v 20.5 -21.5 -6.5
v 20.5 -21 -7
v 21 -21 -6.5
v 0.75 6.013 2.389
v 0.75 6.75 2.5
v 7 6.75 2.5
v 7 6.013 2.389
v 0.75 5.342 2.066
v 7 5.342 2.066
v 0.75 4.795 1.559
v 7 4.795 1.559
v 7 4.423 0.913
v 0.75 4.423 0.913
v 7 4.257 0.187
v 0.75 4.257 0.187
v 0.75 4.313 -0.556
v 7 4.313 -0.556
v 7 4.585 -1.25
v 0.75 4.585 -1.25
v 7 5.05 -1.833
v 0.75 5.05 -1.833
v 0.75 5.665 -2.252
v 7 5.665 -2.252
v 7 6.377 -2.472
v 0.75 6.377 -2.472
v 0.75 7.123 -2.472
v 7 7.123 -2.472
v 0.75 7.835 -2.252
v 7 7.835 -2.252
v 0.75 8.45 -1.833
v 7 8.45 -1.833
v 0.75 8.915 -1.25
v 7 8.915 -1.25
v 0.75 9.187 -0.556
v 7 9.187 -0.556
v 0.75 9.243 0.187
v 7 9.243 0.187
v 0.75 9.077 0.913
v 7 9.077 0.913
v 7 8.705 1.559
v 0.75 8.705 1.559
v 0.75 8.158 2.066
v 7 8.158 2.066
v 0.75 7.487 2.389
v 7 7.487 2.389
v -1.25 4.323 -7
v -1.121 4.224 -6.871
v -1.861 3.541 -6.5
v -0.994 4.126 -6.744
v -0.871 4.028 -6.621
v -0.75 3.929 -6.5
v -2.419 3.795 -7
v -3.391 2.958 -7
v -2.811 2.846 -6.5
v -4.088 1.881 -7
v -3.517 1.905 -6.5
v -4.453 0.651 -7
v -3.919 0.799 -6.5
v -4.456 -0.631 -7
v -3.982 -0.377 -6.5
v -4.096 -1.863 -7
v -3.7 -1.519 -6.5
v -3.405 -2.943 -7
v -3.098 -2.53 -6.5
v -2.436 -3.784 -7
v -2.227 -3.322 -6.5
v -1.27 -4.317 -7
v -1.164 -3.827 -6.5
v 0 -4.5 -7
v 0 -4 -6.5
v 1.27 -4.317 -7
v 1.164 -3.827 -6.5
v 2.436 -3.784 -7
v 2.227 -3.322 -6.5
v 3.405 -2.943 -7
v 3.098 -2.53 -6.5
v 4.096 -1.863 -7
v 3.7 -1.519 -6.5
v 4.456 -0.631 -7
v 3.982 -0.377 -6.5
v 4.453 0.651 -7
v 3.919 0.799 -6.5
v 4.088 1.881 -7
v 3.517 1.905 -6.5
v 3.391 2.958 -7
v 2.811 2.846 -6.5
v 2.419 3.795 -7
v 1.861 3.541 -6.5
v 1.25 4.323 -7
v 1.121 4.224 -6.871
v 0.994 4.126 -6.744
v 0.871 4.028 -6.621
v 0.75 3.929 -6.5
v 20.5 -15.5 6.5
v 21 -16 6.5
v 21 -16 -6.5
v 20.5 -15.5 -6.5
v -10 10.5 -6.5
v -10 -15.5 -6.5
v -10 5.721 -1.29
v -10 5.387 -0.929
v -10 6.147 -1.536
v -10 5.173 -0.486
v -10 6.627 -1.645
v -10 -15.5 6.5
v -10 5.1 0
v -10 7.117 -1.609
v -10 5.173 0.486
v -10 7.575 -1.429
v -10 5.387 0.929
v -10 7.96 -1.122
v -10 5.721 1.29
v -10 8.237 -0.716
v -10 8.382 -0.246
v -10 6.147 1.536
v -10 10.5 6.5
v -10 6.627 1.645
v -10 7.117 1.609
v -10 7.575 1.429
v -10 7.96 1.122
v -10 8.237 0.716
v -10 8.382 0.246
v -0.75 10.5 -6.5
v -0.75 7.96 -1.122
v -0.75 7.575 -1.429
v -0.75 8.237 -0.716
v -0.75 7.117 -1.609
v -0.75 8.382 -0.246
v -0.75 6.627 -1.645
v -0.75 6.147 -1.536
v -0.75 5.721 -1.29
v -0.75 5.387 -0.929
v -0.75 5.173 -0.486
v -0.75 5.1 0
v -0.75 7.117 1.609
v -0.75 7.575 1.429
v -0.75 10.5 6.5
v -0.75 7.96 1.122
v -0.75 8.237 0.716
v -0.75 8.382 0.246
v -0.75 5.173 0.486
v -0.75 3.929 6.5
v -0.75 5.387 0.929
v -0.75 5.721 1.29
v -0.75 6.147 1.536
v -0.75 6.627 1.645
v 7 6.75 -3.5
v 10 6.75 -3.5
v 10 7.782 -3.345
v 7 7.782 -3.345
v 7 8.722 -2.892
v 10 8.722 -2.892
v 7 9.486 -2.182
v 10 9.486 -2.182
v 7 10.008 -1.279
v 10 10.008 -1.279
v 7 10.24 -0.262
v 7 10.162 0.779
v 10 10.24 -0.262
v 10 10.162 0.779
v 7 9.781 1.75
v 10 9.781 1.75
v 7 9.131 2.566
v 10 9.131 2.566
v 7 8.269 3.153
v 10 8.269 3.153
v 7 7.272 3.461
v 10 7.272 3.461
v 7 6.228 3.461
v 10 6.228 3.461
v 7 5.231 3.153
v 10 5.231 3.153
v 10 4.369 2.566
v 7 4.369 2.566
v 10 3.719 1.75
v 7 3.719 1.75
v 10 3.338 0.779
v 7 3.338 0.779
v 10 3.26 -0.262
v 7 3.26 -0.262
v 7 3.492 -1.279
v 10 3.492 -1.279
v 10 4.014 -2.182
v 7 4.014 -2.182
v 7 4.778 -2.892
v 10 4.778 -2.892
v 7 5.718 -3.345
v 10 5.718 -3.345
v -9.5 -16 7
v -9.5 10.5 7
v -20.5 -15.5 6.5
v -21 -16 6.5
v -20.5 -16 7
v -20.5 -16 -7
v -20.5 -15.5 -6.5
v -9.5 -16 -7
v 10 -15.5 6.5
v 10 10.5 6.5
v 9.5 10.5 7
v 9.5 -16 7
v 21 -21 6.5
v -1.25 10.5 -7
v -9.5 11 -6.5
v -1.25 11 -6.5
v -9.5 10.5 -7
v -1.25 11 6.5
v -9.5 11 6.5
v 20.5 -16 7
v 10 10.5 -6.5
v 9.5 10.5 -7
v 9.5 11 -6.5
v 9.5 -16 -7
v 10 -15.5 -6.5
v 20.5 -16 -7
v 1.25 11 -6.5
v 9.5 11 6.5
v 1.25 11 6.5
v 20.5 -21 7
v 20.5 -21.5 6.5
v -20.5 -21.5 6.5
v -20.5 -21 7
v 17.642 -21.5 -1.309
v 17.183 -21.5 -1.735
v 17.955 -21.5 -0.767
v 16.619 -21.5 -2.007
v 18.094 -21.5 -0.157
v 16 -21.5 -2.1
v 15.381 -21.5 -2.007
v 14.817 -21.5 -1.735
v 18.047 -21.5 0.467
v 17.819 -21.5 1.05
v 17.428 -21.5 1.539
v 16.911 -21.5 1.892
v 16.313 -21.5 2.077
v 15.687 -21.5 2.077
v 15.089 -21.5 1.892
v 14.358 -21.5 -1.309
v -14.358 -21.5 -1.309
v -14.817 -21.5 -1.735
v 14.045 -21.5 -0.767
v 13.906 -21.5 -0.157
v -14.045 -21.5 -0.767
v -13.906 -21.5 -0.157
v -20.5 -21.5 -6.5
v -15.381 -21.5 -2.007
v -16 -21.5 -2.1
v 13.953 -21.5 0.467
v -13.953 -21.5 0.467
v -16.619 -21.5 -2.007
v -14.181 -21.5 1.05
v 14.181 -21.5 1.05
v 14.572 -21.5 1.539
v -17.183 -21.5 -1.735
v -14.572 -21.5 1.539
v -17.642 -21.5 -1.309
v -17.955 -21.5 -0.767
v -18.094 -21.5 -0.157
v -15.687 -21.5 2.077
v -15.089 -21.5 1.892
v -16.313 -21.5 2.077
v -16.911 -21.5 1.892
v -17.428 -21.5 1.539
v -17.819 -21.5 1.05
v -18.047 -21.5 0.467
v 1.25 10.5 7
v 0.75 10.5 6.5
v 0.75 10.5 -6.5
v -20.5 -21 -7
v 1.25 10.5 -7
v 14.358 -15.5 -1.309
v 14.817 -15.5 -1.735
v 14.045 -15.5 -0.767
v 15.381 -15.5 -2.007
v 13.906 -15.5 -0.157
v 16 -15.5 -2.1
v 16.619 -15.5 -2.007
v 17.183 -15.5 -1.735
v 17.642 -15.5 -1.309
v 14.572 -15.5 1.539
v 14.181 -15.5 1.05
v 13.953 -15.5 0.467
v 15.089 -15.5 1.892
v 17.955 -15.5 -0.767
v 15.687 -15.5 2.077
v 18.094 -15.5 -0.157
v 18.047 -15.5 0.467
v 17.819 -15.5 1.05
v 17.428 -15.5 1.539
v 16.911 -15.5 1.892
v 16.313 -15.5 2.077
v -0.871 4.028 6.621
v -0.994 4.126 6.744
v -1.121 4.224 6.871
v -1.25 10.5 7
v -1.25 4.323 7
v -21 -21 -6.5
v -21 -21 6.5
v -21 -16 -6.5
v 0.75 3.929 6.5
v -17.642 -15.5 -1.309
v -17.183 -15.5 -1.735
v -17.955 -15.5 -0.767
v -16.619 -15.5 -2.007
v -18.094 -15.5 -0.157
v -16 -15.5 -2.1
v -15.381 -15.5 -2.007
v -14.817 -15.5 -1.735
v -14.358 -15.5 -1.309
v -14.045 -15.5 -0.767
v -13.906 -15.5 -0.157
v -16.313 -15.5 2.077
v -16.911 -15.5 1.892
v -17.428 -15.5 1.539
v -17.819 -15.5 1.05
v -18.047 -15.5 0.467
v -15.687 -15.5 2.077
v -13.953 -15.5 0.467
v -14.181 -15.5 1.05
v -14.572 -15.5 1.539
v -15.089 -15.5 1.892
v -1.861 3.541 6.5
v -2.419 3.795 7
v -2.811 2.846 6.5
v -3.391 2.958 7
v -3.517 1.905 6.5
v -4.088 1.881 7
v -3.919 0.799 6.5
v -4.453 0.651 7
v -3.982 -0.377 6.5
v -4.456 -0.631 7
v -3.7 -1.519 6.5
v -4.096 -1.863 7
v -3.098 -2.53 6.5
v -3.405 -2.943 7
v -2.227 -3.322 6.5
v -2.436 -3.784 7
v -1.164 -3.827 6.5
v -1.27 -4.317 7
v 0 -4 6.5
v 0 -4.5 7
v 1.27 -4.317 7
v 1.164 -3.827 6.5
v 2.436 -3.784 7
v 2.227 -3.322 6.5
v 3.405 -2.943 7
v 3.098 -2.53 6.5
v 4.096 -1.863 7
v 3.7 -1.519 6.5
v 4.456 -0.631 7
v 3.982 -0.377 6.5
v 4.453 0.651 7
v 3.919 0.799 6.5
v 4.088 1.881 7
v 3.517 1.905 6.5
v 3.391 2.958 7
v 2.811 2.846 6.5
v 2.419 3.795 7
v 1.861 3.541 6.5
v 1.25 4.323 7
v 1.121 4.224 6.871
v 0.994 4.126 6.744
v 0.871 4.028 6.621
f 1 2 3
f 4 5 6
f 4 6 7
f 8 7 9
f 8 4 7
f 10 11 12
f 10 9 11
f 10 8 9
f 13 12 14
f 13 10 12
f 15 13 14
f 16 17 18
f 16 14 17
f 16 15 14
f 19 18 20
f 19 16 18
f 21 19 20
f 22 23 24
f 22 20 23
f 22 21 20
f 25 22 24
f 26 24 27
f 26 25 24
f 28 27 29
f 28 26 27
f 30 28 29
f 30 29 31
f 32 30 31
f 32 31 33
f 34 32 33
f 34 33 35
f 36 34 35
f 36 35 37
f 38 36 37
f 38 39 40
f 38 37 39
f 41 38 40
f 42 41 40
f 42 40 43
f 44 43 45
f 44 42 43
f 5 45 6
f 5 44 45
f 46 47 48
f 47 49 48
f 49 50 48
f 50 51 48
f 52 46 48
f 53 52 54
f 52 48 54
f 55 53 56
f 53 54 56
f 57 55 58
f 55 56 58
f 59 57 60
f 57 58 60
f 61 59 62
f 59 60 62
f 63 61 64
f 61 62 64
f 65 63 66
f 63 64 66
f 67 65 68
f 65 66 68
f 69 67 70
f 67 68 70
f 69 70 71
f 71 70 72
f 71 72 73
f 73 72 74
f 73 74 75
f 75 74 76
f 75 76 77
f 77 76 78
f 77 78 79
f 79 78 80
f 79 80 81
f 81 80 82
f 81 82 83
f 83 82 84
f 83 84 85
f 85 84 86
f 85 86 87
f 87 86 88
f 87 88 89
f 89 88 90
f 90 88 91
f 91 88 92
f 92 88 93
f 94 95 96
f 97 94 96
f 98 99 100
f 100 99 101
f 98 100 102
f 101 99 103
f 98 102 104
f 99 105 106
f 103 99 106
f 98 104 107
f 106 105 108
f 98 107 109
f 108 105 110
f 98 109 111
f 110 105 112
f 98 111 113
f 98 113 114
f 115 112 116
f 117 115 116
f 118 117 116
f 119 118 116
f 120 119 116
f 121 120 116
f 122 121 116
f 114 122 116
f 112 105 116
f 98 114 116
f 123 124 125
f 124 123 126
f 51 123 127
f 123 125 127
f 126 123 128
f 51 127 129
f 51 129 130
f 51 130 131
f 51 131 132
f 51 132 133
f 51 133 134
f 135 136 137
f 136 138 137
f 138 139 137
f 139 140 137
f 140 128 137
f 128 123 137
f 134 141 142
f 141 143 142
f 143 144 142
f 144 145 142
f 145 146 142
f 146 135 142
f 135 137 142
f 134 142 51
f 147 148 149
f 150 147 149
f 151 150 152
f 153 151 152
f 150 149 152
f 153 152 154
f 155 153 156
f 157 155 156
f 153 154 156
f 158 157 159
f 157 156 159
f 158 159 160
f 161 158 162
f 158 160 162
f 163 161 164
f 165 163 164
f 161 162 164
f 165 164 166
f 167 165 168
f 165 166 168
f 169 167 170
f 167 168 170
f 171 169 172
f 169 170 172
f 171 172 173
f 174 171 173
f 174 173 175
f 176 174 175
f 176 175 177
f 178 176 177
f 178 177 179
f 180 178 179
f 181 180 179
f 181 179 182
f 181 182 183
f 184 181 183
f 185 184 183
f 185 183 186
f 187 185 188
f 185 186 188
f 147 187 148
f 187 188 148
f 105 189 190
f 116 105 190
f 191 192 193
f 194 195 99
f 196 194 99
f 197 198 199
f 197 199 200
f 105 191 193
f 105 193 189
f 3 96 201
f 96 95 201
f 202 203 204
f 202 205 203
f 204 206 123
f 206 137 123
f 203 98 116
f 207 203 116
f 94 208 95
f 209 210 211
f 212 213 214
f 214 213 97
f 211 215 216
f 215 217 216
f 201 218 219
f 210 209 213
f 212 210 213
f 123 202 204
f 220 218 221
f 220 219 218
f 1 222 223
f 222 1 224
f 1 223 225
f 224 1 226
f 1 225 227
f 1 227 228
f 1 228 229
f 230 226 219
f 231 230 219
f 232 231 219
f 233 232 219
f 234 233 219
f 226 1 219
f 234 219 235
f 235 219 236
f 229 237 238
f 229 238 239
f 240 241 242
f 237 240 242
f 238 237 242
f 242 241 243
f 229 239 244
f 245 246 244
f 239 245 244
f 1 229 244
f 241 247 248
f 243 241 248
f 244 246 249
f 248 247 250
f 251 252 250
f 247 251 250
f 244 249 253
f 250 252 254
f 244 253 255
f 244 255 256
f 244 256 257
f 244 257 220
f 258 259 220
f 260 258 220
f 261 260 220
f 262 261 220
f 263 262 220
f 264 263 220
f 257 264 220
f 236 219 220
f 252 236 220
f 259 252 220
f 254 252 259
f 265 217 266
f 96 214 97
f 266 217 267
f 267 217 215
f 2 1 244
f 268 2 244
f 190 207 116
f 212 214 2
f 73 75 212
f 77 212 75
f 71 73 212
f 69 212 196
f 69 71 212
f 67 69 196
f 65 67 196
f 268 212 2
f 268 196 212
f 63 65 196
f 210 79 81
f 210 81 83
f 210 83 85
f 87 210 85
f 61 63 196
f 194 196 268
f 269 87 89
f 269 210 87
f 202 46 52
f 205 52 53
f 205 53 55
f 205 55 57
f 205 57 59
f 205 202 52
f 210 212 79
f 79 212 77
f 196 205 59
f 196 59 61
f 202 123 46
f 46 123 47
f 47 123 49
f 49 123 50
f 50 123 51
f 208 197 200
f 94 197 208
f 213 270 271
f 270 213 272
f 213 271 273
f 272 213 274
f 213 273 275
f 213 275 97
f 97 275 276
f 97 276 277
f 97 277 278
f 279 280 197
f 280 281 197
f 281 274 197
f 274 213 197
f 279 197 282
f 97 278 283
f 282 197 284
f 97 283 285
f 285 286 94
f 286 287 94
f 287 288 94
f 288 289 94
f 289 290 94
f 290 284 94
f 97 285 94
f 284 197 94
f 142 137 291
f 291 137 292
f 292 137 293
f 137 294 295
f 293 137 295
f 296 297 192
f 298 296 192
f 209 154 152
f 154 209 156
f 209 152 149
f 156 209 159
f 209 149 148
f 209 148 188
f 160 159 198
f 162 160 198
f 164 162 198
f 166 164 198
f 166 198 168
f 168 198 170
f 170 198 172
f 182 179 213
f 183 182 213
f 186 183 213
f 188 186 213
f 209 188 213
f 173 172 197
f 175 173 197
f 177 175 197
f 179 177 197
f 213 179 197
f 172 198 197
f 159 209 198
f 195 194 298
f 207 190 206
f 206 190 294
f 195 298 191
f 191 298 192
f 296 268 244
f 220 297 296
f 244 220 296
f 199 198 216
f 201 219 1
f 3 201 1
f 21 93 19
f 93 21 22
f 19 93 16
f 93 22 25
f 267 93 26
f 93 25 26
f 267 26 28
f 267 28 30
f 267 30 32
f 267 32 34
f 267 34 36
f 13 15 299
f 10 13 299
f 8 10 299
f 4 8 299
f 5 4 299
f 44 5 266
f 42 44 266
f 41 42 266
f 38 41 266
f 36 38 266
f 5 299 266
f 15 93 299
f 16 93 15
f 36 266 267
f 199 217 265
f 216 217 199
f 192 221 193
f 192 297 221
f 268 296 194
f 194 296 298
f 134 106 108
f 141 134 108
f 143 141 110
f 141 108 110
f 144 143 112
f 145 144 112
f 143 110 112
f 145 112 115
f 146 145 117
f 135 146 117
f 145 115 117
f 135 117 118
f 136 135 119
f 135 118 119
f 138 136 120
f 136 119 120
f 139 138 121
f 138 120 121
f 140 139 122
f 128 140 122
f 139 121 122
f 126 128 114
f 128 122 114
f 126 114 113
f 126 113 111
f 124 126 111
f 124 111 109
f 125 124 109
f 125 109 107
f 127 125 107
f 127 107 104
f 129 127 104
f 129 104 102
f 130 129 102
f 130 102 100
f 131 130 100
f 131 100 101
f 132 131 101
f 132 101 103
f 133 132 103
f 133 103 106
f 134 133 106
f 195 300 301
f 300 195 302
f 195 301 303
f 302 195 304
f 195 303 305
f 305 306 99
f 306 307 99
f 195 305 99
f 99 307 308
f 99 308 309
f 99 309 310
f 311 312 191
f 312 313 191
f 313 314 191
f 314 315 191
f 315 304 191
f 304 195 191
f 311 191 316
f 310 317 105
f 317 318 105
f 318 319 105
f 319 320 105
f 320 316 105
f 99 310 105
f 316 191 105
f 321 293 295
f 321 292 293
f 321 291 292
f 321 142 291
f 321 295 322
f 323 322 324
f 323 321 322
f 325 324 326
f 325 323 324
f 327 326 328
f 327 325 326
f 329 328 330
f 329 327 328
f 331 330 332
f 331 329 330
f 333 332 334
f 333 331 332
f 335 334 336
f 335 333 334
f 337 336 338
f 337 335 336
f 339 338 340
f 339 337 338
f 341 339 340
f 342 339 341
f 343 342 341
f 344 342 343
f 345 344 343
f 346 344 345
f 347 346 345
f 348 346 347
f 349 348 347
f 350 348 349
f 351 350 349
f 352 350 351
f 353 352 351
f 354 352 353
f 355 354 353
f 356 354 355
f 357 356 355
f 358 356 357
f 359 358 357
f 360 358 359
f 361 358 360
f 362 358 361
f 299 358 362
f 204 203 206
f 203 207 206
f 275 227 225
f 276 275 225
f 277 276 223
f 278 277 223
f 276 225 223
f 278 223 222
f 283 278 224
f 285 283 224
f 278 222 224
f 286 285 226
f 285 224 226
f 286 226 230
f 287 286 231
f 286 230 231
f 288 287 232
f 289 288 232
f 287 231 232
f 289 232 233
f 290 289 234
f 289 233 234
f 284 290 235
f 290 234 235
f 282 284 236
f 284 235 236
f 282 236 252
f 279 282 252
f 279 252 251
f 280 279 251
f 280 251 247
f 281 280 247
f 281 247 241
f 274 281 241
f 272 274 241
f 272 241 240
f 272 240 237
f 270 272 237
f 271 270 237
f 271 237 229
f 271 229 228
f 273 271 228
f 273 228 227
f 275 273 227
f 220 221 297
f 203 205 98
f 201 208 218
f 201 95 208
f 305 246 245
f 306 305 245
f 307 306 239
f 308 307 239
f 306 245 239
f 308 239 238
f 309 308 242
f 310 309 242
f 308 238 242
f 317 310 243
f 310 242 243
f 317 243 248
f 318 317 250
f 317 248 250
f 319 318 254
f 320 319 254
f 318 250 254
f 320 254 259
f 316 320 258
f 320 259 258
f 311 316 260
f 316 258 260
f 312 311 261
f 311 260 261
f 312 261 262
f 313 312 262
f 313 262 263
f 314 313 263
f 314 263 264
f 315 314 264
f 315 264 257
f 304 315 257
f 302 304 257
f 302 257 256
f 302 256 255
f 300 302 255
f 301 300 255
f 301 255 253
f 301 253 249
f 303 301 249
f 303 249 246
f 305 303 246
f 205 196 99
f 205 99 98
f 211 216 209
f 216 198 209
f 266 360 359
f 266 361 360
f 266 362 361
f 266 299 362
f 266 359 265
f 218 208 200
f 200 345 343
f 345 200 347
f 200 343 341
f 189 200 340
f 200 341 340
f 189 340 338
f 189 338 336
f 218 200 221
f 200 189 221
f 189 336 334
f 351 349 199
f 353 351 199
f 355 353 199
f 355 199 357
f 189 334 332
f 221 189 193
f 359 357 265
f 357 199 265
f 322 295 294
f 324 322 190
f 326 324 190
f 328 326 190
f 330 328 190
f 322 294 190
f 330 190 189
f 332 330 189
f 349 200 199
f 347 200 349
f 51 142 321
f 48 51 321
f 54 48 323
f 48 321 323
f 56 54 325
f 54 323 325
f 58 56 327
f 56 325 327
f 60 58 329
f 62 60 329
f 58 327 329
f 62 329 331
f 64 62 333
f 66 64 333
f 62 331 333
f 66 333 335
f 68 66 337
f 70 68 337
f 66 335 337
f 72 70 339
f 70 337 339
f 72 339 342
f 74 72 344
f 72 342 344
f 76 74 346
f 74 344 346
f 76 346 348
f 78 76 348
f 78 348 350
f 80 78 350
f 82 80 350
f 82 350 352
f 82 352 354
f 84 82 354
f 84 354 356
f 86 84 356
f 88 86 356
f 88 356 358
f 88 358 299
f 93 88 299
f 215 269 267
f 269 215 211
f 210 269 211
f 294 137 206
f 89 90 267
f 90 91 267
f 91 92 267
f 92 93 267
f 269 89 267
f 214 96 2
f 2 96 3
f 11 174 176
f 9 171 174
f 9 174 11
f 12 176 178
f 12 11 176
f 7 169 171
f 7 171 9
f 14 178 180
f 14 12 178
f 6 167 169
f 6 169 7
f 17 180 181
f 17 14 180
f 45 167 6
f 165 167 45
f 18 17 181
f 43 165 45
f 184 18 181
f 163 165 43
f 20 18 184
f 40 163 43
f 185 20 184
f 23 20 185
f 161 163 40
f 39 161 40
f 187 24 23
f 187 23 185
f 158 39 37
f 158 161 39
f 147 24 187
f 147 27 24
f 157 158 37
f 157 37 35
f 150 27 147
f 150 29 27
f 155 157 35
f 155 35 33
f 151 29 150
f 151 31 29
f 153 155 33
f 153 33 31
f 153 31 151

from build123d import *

# Parameters (mm, degrees)
BODY_DEPTH              = 7
SKETCH2_R               = 2.5
BOLT_CLEARANCE_DEPTH    = 31.858548248
SKETCH3_R               = 3.5
BOLT_HEAD_SEATING_DEPTH = 3
CLAMPING_HOLE_M4X0_7_D  = 3.3
MOUNTING_HOLE_M5X0_8_D  = 4.2
CHAMFER_2_SIZE          = 0.5


with BuildPart() as part:
    # Sketch1 → Body (new, symmetric)
    with BuildSketch(Plane.XY):
        with BuildLine():
            Line((-10, 11), (-0.75, 11))
            Line((-0.75, 11), (-0.75, 3.929058411))
            ThreePointArc((-0.75, 3.929058411), (0, -4), (0.75, 3.929058411))
            Line((0.75, 3.929058411), (0.75, 11))
            Line((0.75, 11), (10, 11))
            Line((10, 11), (10, -15.5))
            Line((10, -15.5), (21, -15.5))
            Line((21, -15.5), (21, -21.5))
            Line((21, -21.5), (-21, -21.5))
            Line((-21, -21.5), (-21, -15.5))
            Line((-21, -15.5), (-10, -15.5))
            Line((-10, -15.5), (-10, 11))
        make_face()
    extrude(amount=BODY_DEPTH, both=True)

    # Sketch2 → Bolt Clearance (cut, through all)
    with BuildSketch(Plane(origin=(0, 0, 0), x_dir=(0, 0, -1), z_dir=(1, 0, 0))):
        with Locations((0, 6.75)):
            Circle(SKETCH2_R)
    extrude(amount=BOLT_CLEARANCE_DEPTH, mode=Mode.SUBTRACT)

    # Sketch3 → Bolt Head Seating (cut)
    with BuildSketch(Plane(origin=(10, 0, 0), x_dir=(0, 0, -1), z_dir=(1, 0, 0))):
        with Locations((0, 6.75)):
            Circle(SKETCH3_R)
    extrude(amount=-BOLT_HEAD_SEATING_DEPTH, mode=Mode.SUBTRACT)

    # Clamping Hole (M4x0.7) (through all)
    with Locations(Plane(origin=(-0.75, 6.75, 0), x_dir=(0, 1, 0), z_dir=(1, 0, 0))):
        with Locations((0, 0)):
            Hole(CLAMPING_HOLE_M4X0_7_D / 2)

    # Mounting Hole (M5x0.8) (through all)
    with Locations(Plane(origin=(-16, -15.5, 0), x_dir=(0, 0, 1), z_dir=(0, 1, 0))):
        with Locations((0, 0), (0, 32)):
            Hole(MOUNTING_HOLE_M5X0_8_D / 2)

    # Chamfer 2
    chamfer_2_edges = [part.edges().sort_by_distance(p)[0] for p in [
        (21, -21.5, 0),
        (21, -15.5, 0),
        (-21, -15.5, 0),
        (-21, -21.5, 0),
        (10, 11, 0),
        (0.75, 11, 0),
        (-0.75, 11, 0),
        (-15.5, -15.5, -7),
        (-21, -18.5, -7),
        (0, -21.5, -7),
        (21, -18.5, -7),
        (15.5, -15.5, -7),
        (10, -2.25, -7),
        (5.375, 11, -7),
        (0.75, 7.464529206, -7),
        (0, -4, -7),
        (-0.75, 7.464529206, -7),
        (-5.375, 11, -7),
        (-10, -2.25, -7),
        (-10, 11, 0),
        (-5.375, 11, 7),
        (-0.75, 7.464529206, 7),
        (0, -4, 7),
        (0.75, 7.464529206, 7),
        (5.375, 11, 7),
        (10, -2.25, 7),
        (15.5, -15.5, 7),
        (21, -18.5, 7),
        (0, -21.5, 7),
        (-21, -18.5, 7),
        (-15.5, -15.5, 7),
        (-10, -2.25, 7),
    ]]
    chamfer(chamfer_2_edges, length=CHAMFER_2_SIZE)


solid = part.part
